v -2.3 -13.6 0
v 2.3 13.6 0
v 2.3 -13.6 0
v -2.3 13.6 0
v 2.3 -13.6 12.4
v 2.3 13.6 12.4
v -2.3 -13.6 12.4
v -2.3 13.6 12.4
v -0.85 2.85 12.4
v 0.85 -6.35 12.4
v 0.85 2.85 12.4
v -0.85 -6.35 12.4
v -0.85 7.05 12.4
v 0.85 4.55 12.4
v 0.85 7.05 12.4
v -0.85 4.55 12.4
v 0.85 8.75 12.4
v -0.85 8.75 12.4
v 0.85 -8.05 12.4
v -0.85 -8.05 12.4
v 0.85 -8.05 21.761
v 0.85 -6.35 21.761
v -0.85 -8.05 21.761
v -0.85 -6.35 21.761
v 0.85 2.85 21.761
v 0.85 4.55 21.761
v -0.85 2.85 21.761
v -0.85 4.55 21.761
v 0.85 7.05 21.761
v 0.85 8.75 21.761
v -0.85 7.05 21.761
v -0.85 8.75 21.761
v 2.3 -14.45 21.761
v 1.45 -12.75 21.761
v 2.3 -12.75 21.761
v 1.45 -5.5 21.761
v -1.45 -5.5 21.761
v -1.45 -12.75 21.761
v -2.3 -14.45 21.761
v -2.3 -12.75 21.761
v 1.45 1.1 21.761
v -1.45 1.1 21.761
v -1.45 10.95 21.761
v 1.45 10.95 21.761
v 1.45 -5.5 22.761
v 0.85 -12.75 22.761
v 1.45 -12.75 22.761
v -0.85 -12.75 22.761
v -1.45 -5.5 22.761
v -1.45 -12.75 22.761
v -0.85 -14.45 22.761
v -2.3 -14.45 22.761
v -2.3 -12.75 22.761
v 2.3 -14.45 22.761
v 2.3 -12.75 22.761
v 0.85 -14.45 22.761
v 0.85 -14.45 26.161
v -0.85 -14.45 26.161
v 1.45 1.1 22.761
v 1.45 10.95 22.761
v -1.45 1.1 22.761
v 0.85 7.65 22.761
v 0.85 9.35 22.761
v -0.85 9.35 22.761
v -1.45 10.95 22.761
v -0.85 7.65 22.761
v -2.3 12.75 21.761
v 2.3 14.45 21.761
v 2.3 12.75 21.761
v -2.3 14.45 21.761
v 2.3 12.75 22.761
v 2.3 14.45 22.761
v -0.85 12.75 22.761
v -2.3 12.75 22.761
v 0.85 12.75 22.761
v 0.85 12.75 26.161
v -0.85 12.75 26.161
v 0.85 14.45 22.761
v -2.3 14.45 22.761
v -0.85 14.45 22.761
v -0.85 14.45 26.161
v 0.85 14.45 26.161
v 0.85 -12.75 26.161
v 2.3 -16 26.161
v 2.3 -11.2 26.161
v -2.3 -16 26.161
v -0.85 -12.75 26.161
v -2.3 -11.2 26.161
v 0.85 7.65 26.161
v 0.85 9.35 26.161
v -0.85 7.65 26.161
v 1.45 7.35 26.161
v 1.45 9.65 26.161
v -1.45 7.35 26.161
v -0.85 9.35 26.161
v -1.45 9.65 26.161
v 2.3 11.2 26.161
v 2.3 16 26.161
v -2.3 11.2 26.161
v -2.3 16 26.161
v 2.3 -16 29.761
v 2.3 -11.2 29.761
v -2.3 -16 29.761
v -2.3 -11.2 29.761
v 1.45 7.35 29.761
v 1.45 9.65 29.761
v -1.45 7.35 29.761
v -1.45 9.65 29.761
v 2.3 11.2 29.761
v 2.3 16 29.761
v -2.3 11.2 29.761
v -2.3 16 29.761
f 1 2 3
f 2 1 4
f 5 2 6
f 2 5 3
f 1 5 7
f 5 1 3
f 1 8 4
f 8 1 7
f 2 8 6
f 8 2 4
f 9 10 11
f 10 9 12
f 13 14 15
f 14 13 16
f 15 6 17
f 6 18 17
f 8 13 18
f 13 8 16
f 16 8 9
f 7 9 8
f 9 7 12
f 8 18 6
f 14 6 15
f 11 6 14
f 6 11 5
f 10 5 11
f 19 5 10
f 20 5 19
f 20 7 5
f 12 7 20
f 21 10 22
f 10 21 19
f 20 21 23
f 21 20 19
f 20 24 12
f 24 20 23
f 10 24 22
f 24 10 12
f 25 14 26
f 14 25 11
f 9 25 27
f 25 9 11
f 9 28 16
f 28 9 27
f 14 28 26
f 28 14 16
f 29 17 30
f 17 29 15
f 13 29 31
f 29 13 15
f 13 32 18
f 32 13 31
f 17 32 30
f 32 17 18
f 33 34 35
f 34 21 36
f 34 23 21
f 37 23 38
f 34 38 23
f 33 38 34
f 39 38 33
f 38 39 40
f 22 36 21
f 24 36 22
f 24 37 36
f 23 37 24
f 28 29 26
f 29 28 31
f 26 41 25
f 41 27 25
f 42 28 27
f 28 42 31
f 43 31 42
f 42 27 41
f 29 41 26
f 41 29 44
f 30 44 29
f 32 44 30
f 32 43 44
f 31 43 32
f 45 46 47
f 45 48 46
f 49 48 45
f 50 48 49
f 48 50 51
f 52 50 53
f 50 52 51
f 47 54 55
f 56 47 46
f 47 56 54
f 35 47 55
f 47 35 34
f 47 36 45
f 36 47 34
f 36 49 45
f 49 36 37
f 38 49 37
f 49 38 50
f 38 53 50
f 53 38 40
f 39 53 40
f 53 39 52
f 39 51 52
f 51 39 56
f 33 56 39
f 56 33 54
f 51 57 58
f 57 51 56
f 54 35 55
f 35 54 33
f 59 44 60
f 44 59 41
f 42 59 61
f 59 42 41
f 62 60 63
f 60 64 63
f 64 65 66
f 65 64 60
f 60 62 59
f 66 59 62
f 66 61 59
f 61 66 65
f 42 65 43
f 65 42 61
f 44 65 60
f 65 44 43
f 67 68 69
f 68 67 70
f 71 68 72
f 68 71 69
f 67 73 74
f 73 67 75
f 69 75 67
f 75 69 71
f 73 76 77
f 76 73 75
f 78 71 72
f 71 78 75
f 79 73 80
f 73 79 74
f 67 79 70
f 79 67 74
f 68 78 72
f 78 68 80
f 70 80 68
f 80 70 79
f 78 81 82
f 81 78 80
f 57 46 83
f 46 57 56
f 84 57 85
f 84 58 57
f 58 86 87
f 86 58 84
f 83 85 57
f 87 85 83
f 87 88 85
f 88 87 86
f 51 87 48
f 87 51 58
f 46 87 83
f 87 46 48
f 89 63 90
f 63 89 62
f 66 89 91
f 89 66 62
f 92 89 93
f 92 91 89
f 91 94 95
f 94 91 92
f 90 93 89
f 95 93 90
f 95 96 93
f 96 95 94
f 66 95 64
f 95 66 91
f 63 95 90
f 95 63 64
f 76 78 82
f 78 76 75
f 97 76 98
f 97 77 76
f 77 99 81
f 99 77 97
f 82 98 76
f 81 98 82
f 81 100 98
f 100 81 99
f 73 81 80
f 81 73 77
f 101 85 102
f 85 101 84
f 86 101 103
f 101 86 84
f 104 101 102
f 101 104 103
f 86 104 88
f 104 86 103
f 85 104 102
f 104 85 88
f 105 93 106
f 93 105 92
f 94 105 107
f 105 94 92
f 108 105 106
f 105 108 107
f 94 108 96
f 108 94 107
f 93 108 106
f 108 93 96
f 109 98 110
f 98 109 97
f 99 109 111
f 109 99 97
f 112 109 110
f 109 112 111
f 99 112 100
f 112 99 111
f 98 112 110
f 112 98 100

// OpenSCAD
// Generated by SolidPython 0.4.2 on 2020-09-29 23:22:30
//!OpenSCAD

scale(v = 0.0100000000) {
	translate(v = [-230, -1360, 0]) {
		union() {
			color(c = [0.4000000000, 0.4000000000, 0.4000000000]) {
				translate(v = [0, 0, 0]) {
					linear_extrude(height = 1000.0000000000) {
						polygon(paths = [[0, 1, 2, 3]], points = [[0, 0], [0, 2720], [460, 2720], [460, 0]]);
					}
				}
			}
			color(c = [0.2000000000, 0.6000000000, 0.2000000000]) {
				translate(v = [0, 0, 1000.0000000000]) {
					linear_extrude(height = 120.0000000000) {
						polygon(paths = [[0, 1, 2, 3]], points = [[0, 1305], [0, 2720], [460, 2720], [460, 1305]]);
					}
				}
			}
			color(c = [0.4000000000, 0.4000000000, 0.4000000000]) {
				translate(v = [0, 0, 1000.0000000000]) {
					linear_extrude(height = 120.0000000000) {
						polygon(paths = [[0, 1, 2, 3]], points = [[0, 0], [0, 1305], [460, 1305], [460, 0]]);
					}
				}
			}
			color(c = [0.2000000000, 0.6000000000, 0.2000000000]) {
				translate(v = [0, 0, 1120.0000000000]) {
					linear_extrude(height = 120.0000000000) {
						polygon(paths = [[0, 1, 2, 3]], points = [[0, 1305], [0, 2720], [460, 2720], [460, 1305]]);
					}
				}
			}
			color(c = [0.4000000000, 0.4000000000, 0.4000000000]) {
				translate(v = [0, 0, 1120.0000000000]) {
					linear_extrude(height = 120.0000000000) {
						polygon(paths = [[0, 1, 2, 3]], points = [[0, 0], [0, 1305], [460, 1305], [460, 0]]);
					}
				}
			}
			color(c = [0.1000000000, 0.1000000000, 0.1000000000]) {
				translate(v = [0, 0, 1240.0000000000]) {
					linear_extrude(height = 70.0000000000) {
						polygon(paths = [[0, 1, 2, 3]], points = [[145, 555], [145, 725], [315, 725], [315, 555]]);
					}
				}
			}
			color(c = [0.1000000000, 0.1000000000, 0.1000000000]) {
				translate(v = [0, 0, 1240.0000000000]) {
					linear_extrude(height = 70.0000000000) {
						polygon(paths = [[0, 1, 2, 3]], points = [[145, 1645], [145, 1815], [315, 1815], [315, 1645]]);
					}
				}
			}
			color(c = [0.1000000000, 0.1000000000, 0.1000000000]) {
				translate(v = [0, 0, 1240.0000000000]) {
					linear_extrude(height = 70.0000000000) {
						polygon(paths = [[0, 1, 2, 3]], points = [[145, 2065], [145, 2235], [315, 2235], [315, 2065]]);
					}
				}
			}
			color(c = [0.1000000000, 0.1000000000, 0.1000000000]) {
				translate(v = [0, 0, 1310.0000000000]) {
					linear_extrude(height = 180.0000000000) {
						polygon(paths = [[0, 1, 2, 3]], points = [[145, 555], [145, 725], [315, 725], [315, 555]]);
					}
				}
			}
			color(c = [0.1000000000, 0.1000000000, 0.1000000000]) {
				translate(v = [0, 0, 1310.0000000000]) {
					linear_extrude(height = 180.0000000000) {
						polygon(paths = [[0, 1, 2, 3]], points = [[145, 1645], [145, 1815], [315, 1815], [315, 1645]]);
					}
				}
			}
			color(c = [0.1000000000, 0.1000000000, 0.1000000000]) {
				translate(v = [0, 0, 1310.0000000000]) {
					linear_extrude(height = 180.0000000000) {
						polygon(paths = [[0, 1, 2, 3]], points = [[145, 2065], [145, 2235], [315, 2235], [315, 2065]]);
					}
				}
			}
			color(c = [0.1000000000, 0.1000000000, 0.1000000000]) {
				translate(v = [0, 0, 1490.0000000000]) {
					linear_extrude(height = 686.1000000000) {
						polygon(paths = [[0, 1, 2, 3]], points = [[145, 555], [145, 725], [315, 725], [315, 555]]);
					}
				}
			}
			color(c = [0.1000000000, 0.1000000000, 0.1000000000]) {
				translate(v = [0, 0, 1490.0000000000]) {
					linear_extrude(height = 686.1000000000) {
						polygon(paths = [[0, 1, 2, 3]], points = [[145, 1645], [145, 1815], [315, 1815], [315, 1645]]);
					}
				}
			}
			color(c = [0.1000000000, 0.1000000000, 0.1000000000]) {
				translate(v = [0, 0, 1490.0000000000]) {
					linear_extrude(height = 686.1000000000) {
						polygon(paths = [[0, 1, 2, 3]], points = [[145, 2065], [145, 2235], [315, 2235], [315, 2065]]);
					}
				}
			}
			color(c = [0.9000000000, 0.6000000000, 0.6000000000]) {
				translate(v = [0, 0, 2176.1000000000]) {
					linear_extrude(height = 100.0000000000) {
						polygon(paths = [[0, 1, 2, 3, 4, 5, 6, 7]], points = [[0, -85], [0, 85], [85, 85], [85, 810], [375, 810], [375, 85], [460, 85], [460, -85]]);
					}
				}
			}
			color(c = [0.9000000000, 0.6000000000, 0.6000000000]) {
				translate(v = [0, 0, 2176.1000000000]) {
					linear_extrude(height = 100.0000000000) {
						polygon(paths = [[0, 1, 2, 3]], points = [[85, 1470], [85, 2455], [375, 2455], [375, 1470]]);
					}
				}
			}
			color(c = [0.9000000000, 0.6000000000, 0.6000000000]) {
				translate(v = [0, 0, 2176.1000000000]) {
					linear_extrude(height = 100.0000000000) {
						polygon(paths = [[0, 1, 2, 3]], points = [[0, 2635], [0, 2805], [460, 2805], [460, 2635]]);
					}
				}
			}
			color(c = [0.5000000000, 0.5000000000, 0.5000000000]) {
				translate(v = [0, 0, 2276.1000000000]) {
					linear_extrude(height = 340.0000000000) {
						polygon(paths = [[0, 1, 2, 3]], points = [[145, -85], [145, 85], [315, 85], [315, -85]]);
					}
				}
			}
			color(c = [0.5000000000, 0.5000000000, 0.5000000000]) {
				translate(v = [0, 0, 2276.1000000000]) {
					linear_extrude(height = 340.0000000000) {
						polygon(paths = [[0, 1, 2, 3]], points = [[145, 2125], [145, 2295], [315, 2295], [315, 2125]]);
					}
				}
			}
			color(c = [0.5000000000, 0.5000000000, 0.5000000000]) {
				translate(v = [0, 0, 2276.1000000000]) {
					linear_extrude(height = 340.0000000000) {
						polygon(paths = [[0, 1, 2, 3]], points = [[145, 2635], [145, 2805], [315, 2805], [315, 2635]]);
					}
				}
			}
			color(c = [0.3000000000, 0.3000000000, 1]) {
				translate(v = [0, 0, 2616.1000000000]) {
					linear_extrude(height = 360.0000000000) {
						polygon(paths = [[0, 1, 2, 3]], points = [[0, -240], [0, 240], [460, 240], [460, -240]]);
					}
				}
			}
			color(c = [0.3000000000, 0.3000000000, 1]) {
				translate(v = [0, 0, 2616.1000000000]) {
					linear_extrude(height = 360.0000000000) {
						polygon(paths = [[0, 1, 2, 3]], points = [[85, 2095], [85, 2325], [375, 2325], [375, 2095]]);
					}
				}
			}
			color(c = [0.3000000000, 0.3000000000, 1]) {
				translate(v = [0, 0, 2616.1000000000]) {
					linear_extrude(height = 360.0000000000) {
						polygon(paths = [[0, 1, 2, 3]], points = [[0, 2480], [0, 2960], [460, 2960], [460, 2480]]);
					}
				}
			}
		}
	}
}
